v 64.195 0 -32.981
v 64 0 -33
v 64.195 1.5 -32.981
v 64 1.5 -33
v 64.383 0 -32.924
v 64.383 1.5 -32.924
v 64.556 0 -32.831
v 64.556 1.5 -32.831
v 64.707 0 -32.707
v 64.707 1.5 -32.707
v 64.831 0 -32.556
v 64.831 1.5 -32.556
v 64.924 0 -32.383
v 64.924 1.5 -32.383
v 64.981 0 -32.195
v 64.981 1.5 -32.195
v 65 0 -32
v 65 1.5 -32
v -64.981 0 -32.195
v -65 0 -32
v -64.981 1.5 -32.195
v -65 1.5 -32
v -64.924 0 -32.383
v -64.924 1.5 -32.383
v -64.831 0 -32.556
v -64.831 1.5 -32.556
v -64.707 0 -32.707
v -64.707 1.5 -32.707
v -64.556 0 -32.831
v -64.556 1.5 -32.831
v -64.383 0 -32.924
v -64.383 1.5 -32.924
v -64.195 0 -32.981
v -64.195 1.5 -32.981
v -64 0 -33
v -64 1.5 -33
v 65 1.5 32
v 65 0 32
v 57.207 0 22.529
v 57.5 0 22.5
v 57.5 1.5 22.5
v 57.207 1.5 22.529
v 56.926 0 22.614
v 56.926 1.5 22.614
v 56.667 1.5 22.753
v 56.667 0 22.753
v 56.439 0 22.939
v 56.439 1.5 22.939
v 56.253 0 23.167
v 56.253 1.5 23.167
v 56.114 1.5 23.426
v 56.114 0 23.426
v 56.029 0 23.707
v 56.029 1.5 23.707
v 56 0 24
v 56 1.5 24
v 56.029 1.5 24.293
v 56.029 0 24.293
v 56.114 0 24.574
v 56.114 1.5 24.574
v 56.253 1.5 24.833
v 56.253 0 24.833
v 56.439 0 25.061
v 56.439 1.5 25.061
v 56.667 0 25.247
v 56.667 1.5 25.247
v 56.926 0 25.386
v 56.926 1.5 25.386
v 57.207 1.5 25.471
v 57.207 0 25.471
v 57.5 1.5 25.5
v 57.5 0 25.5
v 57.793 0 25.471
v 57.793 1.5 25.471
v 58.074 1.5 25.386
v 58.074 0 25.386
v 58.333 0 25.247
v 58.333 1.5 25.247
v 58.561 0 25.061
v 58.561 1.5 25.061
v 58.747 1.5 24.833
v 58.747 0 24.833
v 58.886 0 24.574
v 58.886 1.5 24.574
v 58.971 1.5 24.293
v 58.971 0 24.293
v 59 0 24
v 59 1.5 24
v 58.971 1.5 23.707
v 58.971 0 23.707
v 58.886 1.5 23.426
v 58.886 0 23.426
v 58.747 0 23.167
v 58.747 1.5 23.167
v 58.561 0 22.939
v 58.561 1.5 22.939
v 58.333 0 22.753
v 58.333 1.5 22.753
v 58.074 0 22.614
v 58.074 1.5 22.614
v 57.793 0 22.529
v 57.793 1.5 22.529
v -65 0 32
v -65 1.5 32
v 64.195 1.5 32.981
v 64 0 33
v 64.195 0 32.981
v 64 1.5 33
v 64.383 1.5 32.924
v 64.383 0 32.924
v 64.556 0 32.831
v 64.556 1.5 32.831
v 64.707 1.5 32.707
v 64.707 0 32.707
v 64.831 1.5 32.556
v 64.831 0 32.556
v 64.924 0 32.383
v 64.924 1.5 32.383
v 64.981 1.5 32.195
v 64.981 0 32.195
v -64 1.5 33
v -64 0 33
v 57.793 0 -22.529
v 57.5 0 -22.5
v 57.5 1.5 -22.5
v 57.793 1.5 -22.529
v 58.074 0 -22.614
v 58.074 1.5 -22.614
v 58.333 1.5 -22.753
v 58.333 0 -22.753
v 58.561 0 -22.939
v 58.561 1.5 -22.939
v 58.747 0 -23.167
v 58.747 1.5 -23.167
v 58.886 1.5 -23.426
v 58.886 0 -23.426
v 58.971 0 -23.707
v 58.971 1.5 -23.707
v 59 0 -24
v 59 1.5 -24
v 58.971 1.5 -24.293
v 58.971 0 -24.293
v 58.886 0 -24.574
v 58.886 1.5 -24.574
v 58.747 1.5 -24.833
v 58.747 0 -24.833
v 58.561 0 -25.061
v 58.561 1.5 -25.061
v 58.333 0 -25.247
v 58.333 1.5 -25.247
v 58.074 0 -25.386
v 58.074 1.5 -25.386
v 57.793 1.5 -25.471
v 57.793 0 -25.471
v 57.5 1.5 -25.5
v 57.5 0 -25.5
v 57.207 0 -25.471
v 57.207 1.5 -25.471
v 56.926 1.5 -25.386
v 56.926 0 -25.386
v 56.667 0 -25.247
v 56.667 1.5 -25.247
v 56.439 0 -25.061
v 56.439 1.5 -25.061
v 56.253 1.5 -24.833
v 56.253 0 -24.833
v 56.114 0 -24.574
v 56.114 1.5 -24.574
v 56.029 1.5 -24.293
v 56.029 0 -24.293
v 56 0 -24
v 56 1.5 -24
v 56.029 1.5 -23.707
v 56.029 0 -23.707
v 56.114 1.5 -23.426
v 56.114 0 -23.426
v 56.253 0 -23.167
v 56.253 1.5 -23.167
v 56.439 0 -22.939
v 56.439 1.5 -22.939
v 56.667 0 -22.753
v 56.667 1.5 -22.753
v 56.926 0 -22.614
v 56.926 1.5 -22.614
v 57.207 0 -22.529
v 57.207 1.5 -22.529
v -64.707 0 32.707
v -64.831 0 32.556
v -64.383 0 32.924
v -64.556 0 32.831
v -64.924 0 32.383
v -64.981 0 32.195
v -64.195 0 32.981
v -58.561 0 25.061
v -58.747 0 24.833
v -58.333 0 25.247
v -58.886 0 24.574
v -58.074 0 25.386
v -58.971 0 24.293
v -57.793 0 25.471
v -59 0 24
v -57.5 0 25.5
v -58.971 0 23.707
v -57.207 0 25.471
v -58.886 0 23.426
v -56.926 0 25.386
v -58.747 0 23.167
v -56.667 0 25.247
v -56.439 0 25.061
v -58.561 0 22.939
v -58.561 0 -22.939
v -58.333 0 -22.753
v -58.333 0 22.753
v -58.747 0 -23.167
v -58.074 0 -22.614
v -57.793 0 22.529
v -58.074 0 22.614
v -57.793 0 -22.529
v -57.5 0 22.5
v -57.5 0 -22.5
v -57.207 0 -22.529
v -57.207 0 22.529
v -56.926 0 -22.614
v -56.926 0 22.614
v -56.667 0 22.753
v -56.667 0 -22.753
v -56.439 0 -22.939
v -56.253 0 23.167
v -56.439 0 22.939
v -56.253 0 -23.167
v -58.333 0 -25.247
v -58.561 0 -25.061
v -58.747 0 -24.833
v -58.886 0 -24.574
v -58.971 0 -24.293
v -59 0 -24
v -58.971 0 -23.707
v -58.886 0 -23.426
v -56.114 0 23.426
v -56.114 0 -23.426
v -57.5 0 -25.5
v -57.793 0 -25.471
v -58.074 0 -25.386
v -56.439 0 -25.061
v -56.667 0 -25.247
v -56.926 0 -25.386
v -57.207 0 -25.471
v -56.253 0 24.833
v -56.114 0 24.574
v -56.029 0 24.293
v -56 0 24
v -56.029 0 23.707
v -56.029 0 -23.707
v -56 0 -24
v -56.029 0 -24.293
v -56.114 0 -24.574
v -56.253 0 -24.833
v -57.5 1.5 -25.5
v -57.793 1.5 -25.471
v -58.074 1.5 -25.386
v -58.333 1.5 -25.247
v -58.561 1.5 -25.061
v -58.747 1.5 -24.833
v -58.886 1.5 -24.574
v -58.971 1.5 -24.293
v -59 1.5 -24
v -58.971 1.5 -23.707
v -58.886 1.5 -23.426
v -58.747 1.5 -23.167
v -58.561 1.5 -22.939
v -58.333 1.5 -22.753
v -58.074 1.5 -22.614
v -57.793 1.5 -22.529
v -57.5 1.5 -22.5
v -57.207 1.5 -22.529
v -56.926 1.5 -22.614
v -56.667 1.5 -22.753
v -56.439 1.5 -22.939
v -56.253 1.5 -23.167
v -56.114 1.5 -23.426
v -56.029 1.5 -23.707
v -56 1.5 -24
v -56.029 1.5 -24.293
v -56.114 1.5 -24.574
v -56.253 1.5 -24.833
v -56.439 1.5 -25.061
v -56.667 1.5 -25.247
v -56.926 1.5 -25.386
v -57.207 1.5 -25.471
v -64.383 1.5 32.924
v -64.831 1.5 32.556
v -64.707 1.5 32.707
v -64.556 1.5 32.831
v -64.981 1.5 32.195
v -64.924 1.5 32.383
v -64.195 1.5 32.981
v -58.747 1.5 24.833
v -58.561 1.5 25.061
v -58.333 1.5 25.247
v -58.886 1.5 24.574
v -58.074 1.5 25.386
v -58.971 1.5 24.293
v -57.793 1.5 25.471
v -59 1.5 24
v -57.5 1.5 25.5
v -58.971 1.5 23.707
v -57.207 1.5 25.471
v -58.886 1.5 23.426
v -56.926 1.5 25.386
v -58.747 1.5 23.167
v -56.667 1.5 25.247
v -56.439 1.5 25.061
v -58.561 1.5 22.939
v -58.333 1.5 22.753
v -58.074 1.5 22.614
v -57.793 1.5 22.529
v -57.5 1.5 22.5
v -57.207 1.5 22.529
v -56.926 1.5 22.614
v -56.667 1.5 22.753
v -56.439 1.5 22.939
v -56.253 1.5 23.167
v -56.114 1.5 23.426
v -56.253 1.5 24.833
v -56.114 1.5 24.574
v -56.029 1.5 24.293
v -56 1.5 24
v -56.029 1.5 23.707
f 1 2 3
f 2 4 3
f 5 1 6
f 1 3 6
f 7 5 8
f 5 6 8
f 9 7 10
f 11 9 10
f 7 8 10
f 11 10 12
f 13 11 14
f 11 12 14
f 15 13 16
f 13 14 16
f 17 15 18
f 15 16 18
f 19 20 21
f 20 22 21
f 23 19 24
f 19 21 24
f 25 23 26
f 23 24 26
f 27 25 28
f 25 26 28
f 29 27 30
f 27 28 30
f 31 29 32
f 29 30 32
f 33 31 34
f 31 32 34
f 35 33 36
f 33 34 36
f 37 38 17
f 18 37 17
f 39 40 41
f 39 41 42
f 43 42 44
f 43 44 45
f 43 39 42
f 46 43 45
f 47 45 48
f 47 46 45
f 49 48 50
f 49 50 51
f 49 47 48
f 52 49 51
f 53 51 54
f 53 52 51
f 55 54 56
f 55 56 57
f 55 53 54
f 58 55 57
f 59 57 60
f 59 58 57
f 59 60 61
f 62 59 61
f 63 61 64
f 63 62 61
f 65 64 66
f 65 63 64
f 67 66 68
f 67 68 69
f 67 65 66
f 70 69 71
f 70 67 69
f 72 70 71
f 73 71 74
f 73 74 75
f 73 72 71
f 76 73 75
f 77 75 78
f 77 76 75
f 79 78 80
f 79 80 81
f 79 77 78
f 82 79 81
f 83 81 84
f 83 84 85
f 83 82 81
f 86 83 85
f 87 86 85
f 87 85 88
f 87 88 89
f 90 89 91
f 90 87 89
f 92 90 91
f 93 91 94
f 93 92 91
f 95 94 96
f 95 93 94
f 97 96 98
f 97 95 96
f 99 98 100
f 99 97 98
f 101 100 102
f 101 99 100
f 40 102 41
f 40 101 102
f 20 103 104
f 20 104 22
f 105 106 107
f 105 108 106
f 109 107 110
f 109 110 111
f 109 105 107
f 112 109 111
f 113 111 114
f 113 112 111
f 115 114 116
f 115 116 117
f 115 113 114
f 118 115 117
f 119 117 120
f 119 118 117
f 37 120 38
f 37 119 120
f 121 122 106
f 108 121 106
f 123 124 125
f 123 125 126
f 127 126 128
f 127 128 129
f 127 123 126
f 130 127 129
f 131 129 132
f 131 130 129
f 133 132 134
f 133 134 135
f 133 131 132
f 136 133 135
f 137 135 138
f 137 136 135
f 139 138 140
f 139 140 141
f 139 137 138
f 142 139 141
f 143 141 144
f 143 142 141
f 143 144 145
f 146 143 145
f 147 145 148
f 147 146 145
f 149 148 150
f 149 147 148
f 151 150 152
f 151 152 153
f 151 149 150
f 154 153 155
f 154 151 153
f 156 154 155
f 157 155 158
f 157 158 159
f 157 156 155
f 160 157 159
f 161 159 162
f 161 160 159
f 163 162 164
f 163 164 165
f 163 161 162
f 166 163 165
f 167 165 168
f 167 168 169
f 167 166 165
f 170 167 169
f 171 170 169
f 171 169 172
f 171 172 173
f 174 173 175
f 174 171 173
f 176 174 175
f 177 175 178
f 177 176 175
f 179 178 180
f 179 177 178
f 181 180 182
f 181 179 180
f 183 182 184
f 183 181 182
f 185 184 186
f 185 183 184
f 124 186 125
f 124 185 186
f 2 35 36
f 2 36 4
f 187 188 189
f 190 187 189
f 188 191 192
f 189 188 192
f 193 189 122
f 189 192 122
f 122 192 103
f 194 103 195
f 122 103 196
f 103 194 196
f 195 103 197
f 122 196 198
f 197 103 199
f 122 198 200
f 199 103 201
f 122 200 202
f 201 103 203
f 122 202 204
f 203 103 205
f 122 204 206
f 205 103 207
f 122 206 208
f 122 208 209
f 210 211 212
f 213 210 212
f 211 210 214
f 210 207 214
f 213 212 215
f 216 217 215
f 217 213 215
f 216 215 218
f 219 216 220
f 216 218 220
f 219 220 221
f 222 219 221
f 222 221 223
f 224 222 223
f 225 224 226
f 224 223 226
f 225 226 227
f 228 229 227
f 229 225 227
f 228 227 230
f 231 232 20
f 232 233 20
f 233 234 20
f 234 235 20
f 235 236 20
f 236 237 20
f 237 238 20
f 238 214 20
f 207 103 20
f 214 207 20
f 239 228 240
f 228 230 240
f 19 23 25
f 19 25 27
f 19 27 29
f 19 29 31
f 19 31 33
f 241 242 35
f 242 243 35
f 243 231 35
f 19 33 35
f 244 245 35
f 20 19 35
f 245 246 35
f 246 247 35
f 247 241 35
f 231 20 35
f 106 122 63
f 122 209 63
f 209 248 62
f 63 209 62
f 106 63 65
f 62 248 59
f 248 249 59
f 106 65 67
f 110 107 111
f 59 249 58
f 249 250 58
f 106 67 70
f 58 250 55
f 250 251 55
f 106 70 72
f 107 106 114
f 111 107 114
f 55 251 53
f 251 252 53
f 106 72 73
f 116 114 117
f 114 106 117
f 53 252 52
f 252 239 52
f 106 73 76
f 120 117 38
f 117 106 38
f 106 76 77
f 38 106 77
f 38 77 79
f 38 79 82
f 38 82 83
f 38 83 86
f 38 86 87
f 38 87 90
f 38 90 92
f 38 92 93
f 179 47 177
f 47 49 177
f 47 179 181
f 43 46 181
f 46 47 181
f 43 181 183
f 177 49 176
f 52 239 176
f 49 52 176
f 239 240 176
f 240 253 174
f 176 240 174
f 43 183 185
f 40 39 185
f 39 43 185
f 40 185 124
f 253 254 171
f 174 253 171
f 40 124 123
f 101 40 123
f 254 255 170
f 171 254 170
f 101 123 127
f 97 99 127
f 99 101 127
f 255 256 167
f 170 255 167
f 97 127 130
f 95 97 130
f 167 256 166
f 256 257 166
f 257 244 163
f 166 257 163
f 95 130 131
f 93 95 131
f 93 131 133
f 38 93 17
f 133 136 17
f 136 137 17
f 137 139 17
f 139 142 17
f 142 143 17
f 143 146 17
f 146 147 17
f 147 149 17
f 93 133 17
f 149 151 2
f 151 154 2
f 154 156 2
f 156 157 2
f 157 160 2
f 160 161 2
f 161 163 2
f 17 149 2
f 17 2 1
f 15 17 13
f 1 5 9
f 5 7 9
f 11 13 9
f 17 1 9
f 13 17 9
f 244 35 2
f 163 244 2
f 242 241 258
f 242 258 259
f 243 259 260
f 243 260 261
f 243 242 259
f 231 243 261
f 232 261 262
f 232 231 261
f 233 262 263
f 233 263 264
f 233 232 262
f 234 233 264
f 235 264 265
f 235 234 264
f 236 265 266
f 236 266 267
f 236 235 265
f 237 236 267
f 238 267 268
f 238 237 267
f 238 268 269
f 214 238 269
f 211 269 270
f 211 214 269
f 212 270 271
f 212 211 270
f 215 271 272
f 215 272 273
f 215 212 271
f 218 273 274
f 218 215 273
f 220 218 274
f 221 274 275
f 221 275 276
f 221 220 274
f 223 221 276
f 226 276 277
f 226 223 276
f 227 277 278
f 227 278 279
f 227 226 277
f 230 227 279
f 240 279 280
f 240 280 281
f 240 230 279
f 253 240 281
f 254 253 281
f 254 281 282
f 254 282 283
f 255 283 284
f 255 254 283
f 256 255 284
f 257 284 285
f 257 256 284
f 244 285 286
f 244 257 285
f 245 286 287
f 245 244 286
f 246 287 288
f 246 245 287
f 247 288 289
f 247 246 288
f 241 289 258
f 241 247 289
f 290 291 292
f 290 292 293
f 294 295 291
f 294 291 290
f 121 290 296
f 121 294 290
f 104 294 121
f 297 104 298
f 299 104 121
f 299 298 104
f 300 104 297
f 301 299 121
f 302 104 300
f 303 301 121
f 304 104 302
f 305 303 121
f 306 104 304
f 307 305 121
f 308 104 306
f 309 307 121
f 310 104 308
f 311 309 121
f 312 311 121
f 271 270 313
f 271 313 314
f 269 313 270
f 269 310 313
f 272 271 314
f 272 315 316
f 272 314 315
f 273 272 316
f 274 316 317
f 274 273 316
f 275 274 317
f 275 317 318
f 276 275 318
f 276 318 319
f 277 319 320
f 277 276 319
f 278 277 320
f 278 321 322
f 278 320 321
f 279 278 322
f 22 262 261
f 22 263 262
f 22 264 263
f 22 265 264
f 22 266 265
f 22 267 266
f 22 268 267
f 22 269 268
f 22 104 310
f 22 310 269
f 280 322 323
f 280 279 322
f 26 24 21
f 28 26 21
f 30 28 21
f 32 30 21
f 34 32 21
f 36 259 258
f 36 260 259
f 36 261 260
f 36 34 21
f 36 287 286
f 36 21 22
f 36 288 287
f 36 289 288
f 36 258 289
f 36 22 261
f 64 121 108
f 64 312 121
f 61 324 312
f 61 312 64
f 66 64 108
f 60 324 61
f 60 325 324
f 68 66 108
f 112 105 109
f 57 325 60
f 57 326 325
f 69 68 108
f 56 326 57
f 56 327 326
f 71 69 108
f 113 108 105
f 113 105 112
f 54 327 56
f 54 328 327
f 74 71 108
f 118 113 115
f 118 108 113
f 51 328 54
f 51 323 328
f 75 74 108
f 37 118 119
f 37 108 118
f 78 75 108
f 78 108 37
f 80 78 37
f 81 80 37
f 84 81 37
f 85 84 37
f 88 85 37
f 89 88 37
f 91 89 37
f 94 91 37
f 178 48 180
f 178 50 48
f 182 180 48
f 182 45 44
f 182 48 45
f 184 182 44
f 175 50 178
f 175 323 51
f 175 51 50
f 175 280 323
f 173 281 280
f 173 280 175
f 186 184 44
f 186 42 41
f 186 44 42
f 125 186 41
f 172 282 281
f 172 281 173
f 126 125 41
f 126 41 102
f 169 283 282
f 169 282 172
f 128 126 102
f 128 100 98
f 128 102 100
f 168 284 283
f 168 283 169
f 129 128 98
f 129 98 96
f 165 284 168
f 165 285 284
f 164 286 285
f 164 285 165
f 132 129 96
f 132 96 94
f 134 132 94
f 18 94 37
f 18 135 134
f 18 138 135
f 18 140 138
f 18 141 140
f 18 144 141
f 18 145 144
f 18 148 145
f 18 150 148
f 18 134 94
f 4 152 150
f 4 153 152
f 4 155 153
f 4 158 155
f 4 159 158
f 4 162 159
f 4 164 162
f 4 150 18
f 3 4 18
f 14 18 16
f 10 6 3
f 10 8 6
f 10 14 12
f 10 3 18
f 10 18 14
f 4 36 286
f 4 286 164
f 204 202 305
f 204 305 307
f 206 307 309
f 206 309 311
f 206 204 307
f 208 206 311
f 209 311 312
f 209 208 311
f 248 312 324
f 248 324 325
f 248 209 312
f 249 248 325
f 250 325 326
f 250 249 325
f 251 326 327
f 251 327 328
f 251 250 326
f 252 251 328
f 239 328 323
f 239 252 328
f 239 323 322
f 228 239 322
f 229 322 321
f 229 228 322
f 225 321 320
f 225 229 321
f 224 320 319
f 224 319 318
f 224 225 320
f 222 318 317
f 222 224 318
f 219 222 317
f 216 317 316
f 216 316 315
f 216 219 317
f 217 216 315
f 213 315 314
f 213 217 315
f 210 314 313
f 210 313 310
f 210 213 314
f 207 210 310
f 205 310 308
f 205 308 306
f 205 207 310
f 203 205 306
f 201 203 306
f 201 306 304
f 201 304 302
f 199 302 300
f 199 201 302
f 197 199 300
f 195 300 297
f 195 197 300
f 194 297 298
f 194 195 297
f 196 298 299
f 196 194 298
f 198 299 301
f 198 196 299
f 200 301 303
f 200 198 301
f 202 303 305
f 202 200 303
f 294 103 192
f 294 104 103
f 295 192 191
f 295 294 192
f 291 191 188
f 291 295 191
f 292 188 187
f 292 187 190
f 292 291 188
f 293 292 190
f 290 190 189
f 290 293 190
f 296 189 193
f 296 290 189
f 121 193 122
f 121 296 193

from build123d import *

# Parameters (mm, degrees)
ESQUISSE1_W        = 130
ESQUISSE1_H        = 66
ESQUISSE1_R        = 1.5
BOSS_EXTRU_1_DEPTH = 1.5
CONG_1_R           = 1


with BuildPart() as part:
    # Esquisse1 → Boss.-Extru.1 (new body)
    with BuildSketch(Plane(origin=(0, 0, 0), x_dir=(1, 0, 0), z_dir=(0, 1, 0))):
        Rectangle(ESQUISSE1_W, ESQUISSE1_H)
        with Locations(Location((57.5, 24, 0), (0, 0, 270))):
            Circle(ESQUISSE1_R, mode=Mode.SUBTRACT)
        with Locations(Location((-57.5, 24, 0), (0, 0, 90))):
            Circle(ESQUISSE1_R, mode=Mode.SUBTRACT)
        with Locations(Location((-57.5, -24, 0), (0, 0, 270))):
            Circle(ESQUISSE1_R, mode=Mode.SUBTRACT)
        with Locations(Location((57.5, -24, 0), (0, 0, 90))):
            Circle(ESQUISSE1_R, mode=Mode.SUBTRACT)
    extrude(amount=BOSS_EXTRU_1_DEPTH)

    # Congé1
    cong_1_edges = [part.edges().sort_by_distance(p)[0] for p in [
        (-65, 0.75, -33),
        (65, 0.75, -33),
        (65, 0.75, 33),
        (-65, 0.75, 33),
    ]]
    fillet(cong_1_edges, radius=CONG_1_R)


solid = part.part
